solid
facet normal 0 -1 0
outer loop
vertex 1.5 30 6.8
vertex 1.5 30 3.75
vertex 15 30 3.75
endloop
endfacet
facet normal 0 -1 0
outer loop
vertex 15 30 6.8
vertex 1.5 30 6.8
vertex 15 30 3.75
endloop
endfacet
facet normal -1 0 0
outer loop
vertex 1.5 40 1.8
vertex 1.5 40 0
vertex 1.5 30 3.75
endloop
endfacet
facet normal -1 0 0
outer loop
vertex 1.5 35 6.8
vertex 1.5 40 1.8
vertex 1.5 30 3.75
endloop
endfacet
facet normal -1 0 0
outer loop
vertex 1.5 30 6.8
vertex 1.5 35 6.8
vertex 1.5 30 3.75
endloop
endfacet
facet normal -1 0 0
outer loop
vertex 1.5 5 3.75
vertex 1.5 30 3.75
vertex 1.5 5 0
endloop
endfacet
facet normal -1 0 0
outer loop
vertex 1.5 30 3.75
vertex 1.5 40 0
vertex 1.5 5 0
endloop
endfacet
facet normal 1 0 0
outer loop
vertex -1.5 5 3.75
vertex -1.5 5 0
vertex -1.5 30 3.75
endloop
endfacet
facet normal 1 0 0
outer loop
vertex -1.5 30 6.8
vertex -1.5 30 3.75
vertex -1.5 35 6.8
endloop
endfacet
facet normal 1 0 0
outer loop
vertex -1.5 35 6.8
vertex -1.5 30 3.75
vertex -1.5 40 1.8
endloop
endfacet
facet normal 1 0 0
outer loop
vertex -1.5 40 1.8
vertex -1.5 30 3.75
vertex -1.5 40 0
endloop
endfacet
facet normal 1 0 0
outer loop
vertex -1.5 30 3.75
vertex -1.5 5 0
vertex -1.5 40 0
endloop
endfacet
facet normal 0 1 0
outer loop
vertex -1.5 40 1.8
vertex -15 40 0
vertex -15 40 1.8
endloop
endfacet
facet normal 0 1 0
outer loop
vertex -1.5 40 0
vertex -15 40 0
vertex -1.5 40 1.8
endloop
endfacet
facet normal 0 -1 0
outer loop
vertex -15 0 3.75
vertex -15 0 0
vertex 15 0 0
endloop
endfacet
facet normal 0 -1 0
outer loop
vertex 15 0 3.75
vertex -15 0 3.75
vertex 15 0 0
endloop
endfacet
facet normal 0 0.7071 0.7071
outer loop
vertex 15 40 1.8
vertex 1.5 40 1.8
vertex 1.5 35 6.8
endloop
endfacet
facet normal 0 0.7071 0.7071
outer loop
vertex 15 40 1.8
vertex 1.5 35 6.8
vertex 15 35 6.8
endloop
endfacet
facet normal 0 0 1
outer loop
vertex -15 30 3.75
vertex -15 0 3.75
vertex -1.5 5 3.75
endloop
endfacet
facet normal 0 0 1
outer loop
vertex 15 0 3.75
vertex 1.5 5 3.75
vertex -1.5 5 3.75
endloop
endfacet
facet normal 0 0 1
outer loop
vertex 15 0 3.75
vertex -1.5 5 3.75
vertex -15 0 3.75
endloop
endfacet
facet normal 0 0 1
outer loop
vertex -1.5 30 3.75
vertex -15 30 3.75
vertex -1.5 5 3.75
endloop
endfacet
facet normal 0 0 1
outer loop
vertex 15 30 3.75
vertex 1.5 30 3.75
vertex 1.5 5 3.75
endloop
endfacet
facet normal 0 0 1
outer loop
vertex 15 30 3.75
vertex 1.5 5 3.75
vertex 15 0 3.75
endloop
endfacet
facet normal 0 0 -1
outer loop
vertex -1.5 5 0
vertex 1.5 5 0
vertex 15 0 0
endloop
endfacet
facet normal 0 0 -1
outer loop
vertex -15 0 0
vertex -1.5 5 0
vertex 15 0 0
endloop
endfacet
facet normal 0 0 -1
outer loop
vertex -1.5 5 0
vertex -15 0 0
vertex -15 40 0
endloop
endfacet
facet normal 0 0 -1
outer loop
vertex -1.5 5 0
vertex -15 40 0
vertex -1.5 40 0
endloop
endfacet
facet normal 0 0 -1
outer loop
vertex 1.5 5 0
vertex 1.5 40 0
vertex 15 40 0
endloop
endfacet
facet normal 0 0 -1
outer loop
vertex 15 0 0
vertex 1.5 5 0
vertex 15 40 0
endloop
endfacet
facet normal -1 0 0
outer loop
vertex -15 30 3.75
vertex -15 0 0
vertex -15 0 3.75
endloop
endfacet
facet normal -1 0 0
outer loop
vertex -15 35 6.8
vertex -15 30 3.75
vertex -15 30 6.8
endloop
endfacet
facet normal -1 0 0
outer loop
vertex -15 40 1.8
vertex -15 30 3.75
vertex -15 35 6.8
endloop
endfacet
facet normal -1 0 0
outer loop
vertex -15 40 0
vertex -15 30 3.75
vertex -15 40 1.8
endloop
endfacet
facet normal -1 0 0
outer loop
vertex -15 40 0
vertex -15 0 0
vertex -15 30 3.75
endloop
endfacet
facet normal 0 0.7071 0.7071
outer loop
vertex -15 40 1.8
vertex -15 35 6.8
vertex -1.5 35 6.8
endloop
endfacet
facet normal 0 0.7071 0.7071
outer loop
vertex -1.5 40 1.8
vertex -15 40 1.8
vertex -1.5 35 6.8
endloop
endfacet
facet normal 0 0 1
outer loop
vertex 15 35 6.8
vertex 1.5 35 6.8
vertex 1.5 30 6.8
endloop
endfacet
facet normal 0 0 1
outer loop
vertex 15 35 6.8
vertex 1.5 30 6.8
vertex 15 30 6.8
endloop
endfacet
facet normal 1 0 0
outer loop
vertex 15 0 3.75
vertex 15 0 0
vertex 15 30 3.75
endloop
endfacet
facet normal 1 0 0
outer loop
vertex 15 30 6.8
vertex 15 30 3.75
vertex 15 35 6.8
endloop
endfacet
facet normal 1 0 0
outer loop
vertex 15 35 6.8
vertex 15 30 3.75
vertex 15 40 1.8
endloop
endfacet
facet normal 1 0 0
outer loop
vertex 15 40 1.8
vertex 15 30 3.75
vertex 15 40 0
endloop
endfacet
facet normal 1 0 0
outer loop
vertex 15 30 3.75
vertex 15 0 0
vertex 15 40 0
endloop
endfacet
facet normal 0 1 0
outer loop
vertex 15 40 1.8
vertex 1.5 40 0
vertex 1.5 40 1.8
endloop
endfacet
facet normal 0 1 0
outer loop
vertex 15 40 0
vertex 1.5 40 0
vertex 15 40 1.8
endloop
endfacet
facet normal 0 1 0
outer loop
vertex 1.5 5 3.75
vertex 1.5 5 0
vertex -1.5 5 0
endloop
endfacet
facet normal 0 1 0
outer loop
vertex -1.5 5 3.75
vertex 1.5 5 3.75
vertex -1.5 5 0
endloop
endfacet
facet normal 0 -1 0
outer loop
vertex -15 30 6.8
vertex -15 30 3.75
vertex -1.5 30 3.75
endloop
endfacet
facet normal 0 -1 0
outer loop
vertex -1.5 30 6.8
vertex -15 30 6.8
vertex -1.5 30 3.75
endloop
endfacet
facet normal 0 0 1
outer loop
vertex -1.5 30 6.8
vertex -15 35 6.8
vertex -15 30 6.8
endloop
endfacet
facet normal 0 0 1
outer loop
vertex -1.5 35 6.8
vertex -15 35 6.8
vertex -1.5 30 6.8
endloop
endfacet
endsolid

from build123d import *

# Parameters (mm, degrees)
F0_W     = 13.5
F0_H     = 25
F0_W_2   = 1.5
F0_H_2   = 5
F1_DEPTH = 3.75
F0_H_3   = 10
F2_DEPTH = 6.8
F3_SIZE  = 5


with BuildPart() as f1:
    # F0 (on Top) → F1 (new body)
    with BuildSketch(Plane.XY):
        with Locations((-8.25, 17.5)):
            Rectangle(F0_W, F0_H)
        Polygon((1.5, 30), (1.5, 5), (15, 4.9196085972), (15, 30), align=None)
        Polygon((1.5, 5), (1.5, 0), (15, 0), (15, 4.9196085972), align=None)
        with Locations((0.75, 2.5)):
            Rectangle(F0_W_2, F0_H_2)
        with Locations((-0.75, 2.5)):
            Rectangle(F0_W_2, F0_H_2)
        with Locations((-8.25, 2.5)):
            Rectangle(F0_W, F0_H_2)
    extrude(amount=F1_DEPTH)

    # F0 (on Top) → F2 (join)
    with BuildSketch(Plane.XY):
        with Locations((-8.25, 35)):
            Rectangle(F0_W, F0_H_3)
        with Locations((8.25, 35)):
            Rectangle(F0_W, F0_H_3)
    extrude(amount=F2_DEPTH)

    # F3
    f3_edges = [f1.edges().sort_by_distance(p)[0] for p in [
        (-8.25, 40, 6.8),
        (8.25, 40, 6.8),
    ]]
    chamfer(f3_edges, length=F3_SIZE)


solid = f1.part
